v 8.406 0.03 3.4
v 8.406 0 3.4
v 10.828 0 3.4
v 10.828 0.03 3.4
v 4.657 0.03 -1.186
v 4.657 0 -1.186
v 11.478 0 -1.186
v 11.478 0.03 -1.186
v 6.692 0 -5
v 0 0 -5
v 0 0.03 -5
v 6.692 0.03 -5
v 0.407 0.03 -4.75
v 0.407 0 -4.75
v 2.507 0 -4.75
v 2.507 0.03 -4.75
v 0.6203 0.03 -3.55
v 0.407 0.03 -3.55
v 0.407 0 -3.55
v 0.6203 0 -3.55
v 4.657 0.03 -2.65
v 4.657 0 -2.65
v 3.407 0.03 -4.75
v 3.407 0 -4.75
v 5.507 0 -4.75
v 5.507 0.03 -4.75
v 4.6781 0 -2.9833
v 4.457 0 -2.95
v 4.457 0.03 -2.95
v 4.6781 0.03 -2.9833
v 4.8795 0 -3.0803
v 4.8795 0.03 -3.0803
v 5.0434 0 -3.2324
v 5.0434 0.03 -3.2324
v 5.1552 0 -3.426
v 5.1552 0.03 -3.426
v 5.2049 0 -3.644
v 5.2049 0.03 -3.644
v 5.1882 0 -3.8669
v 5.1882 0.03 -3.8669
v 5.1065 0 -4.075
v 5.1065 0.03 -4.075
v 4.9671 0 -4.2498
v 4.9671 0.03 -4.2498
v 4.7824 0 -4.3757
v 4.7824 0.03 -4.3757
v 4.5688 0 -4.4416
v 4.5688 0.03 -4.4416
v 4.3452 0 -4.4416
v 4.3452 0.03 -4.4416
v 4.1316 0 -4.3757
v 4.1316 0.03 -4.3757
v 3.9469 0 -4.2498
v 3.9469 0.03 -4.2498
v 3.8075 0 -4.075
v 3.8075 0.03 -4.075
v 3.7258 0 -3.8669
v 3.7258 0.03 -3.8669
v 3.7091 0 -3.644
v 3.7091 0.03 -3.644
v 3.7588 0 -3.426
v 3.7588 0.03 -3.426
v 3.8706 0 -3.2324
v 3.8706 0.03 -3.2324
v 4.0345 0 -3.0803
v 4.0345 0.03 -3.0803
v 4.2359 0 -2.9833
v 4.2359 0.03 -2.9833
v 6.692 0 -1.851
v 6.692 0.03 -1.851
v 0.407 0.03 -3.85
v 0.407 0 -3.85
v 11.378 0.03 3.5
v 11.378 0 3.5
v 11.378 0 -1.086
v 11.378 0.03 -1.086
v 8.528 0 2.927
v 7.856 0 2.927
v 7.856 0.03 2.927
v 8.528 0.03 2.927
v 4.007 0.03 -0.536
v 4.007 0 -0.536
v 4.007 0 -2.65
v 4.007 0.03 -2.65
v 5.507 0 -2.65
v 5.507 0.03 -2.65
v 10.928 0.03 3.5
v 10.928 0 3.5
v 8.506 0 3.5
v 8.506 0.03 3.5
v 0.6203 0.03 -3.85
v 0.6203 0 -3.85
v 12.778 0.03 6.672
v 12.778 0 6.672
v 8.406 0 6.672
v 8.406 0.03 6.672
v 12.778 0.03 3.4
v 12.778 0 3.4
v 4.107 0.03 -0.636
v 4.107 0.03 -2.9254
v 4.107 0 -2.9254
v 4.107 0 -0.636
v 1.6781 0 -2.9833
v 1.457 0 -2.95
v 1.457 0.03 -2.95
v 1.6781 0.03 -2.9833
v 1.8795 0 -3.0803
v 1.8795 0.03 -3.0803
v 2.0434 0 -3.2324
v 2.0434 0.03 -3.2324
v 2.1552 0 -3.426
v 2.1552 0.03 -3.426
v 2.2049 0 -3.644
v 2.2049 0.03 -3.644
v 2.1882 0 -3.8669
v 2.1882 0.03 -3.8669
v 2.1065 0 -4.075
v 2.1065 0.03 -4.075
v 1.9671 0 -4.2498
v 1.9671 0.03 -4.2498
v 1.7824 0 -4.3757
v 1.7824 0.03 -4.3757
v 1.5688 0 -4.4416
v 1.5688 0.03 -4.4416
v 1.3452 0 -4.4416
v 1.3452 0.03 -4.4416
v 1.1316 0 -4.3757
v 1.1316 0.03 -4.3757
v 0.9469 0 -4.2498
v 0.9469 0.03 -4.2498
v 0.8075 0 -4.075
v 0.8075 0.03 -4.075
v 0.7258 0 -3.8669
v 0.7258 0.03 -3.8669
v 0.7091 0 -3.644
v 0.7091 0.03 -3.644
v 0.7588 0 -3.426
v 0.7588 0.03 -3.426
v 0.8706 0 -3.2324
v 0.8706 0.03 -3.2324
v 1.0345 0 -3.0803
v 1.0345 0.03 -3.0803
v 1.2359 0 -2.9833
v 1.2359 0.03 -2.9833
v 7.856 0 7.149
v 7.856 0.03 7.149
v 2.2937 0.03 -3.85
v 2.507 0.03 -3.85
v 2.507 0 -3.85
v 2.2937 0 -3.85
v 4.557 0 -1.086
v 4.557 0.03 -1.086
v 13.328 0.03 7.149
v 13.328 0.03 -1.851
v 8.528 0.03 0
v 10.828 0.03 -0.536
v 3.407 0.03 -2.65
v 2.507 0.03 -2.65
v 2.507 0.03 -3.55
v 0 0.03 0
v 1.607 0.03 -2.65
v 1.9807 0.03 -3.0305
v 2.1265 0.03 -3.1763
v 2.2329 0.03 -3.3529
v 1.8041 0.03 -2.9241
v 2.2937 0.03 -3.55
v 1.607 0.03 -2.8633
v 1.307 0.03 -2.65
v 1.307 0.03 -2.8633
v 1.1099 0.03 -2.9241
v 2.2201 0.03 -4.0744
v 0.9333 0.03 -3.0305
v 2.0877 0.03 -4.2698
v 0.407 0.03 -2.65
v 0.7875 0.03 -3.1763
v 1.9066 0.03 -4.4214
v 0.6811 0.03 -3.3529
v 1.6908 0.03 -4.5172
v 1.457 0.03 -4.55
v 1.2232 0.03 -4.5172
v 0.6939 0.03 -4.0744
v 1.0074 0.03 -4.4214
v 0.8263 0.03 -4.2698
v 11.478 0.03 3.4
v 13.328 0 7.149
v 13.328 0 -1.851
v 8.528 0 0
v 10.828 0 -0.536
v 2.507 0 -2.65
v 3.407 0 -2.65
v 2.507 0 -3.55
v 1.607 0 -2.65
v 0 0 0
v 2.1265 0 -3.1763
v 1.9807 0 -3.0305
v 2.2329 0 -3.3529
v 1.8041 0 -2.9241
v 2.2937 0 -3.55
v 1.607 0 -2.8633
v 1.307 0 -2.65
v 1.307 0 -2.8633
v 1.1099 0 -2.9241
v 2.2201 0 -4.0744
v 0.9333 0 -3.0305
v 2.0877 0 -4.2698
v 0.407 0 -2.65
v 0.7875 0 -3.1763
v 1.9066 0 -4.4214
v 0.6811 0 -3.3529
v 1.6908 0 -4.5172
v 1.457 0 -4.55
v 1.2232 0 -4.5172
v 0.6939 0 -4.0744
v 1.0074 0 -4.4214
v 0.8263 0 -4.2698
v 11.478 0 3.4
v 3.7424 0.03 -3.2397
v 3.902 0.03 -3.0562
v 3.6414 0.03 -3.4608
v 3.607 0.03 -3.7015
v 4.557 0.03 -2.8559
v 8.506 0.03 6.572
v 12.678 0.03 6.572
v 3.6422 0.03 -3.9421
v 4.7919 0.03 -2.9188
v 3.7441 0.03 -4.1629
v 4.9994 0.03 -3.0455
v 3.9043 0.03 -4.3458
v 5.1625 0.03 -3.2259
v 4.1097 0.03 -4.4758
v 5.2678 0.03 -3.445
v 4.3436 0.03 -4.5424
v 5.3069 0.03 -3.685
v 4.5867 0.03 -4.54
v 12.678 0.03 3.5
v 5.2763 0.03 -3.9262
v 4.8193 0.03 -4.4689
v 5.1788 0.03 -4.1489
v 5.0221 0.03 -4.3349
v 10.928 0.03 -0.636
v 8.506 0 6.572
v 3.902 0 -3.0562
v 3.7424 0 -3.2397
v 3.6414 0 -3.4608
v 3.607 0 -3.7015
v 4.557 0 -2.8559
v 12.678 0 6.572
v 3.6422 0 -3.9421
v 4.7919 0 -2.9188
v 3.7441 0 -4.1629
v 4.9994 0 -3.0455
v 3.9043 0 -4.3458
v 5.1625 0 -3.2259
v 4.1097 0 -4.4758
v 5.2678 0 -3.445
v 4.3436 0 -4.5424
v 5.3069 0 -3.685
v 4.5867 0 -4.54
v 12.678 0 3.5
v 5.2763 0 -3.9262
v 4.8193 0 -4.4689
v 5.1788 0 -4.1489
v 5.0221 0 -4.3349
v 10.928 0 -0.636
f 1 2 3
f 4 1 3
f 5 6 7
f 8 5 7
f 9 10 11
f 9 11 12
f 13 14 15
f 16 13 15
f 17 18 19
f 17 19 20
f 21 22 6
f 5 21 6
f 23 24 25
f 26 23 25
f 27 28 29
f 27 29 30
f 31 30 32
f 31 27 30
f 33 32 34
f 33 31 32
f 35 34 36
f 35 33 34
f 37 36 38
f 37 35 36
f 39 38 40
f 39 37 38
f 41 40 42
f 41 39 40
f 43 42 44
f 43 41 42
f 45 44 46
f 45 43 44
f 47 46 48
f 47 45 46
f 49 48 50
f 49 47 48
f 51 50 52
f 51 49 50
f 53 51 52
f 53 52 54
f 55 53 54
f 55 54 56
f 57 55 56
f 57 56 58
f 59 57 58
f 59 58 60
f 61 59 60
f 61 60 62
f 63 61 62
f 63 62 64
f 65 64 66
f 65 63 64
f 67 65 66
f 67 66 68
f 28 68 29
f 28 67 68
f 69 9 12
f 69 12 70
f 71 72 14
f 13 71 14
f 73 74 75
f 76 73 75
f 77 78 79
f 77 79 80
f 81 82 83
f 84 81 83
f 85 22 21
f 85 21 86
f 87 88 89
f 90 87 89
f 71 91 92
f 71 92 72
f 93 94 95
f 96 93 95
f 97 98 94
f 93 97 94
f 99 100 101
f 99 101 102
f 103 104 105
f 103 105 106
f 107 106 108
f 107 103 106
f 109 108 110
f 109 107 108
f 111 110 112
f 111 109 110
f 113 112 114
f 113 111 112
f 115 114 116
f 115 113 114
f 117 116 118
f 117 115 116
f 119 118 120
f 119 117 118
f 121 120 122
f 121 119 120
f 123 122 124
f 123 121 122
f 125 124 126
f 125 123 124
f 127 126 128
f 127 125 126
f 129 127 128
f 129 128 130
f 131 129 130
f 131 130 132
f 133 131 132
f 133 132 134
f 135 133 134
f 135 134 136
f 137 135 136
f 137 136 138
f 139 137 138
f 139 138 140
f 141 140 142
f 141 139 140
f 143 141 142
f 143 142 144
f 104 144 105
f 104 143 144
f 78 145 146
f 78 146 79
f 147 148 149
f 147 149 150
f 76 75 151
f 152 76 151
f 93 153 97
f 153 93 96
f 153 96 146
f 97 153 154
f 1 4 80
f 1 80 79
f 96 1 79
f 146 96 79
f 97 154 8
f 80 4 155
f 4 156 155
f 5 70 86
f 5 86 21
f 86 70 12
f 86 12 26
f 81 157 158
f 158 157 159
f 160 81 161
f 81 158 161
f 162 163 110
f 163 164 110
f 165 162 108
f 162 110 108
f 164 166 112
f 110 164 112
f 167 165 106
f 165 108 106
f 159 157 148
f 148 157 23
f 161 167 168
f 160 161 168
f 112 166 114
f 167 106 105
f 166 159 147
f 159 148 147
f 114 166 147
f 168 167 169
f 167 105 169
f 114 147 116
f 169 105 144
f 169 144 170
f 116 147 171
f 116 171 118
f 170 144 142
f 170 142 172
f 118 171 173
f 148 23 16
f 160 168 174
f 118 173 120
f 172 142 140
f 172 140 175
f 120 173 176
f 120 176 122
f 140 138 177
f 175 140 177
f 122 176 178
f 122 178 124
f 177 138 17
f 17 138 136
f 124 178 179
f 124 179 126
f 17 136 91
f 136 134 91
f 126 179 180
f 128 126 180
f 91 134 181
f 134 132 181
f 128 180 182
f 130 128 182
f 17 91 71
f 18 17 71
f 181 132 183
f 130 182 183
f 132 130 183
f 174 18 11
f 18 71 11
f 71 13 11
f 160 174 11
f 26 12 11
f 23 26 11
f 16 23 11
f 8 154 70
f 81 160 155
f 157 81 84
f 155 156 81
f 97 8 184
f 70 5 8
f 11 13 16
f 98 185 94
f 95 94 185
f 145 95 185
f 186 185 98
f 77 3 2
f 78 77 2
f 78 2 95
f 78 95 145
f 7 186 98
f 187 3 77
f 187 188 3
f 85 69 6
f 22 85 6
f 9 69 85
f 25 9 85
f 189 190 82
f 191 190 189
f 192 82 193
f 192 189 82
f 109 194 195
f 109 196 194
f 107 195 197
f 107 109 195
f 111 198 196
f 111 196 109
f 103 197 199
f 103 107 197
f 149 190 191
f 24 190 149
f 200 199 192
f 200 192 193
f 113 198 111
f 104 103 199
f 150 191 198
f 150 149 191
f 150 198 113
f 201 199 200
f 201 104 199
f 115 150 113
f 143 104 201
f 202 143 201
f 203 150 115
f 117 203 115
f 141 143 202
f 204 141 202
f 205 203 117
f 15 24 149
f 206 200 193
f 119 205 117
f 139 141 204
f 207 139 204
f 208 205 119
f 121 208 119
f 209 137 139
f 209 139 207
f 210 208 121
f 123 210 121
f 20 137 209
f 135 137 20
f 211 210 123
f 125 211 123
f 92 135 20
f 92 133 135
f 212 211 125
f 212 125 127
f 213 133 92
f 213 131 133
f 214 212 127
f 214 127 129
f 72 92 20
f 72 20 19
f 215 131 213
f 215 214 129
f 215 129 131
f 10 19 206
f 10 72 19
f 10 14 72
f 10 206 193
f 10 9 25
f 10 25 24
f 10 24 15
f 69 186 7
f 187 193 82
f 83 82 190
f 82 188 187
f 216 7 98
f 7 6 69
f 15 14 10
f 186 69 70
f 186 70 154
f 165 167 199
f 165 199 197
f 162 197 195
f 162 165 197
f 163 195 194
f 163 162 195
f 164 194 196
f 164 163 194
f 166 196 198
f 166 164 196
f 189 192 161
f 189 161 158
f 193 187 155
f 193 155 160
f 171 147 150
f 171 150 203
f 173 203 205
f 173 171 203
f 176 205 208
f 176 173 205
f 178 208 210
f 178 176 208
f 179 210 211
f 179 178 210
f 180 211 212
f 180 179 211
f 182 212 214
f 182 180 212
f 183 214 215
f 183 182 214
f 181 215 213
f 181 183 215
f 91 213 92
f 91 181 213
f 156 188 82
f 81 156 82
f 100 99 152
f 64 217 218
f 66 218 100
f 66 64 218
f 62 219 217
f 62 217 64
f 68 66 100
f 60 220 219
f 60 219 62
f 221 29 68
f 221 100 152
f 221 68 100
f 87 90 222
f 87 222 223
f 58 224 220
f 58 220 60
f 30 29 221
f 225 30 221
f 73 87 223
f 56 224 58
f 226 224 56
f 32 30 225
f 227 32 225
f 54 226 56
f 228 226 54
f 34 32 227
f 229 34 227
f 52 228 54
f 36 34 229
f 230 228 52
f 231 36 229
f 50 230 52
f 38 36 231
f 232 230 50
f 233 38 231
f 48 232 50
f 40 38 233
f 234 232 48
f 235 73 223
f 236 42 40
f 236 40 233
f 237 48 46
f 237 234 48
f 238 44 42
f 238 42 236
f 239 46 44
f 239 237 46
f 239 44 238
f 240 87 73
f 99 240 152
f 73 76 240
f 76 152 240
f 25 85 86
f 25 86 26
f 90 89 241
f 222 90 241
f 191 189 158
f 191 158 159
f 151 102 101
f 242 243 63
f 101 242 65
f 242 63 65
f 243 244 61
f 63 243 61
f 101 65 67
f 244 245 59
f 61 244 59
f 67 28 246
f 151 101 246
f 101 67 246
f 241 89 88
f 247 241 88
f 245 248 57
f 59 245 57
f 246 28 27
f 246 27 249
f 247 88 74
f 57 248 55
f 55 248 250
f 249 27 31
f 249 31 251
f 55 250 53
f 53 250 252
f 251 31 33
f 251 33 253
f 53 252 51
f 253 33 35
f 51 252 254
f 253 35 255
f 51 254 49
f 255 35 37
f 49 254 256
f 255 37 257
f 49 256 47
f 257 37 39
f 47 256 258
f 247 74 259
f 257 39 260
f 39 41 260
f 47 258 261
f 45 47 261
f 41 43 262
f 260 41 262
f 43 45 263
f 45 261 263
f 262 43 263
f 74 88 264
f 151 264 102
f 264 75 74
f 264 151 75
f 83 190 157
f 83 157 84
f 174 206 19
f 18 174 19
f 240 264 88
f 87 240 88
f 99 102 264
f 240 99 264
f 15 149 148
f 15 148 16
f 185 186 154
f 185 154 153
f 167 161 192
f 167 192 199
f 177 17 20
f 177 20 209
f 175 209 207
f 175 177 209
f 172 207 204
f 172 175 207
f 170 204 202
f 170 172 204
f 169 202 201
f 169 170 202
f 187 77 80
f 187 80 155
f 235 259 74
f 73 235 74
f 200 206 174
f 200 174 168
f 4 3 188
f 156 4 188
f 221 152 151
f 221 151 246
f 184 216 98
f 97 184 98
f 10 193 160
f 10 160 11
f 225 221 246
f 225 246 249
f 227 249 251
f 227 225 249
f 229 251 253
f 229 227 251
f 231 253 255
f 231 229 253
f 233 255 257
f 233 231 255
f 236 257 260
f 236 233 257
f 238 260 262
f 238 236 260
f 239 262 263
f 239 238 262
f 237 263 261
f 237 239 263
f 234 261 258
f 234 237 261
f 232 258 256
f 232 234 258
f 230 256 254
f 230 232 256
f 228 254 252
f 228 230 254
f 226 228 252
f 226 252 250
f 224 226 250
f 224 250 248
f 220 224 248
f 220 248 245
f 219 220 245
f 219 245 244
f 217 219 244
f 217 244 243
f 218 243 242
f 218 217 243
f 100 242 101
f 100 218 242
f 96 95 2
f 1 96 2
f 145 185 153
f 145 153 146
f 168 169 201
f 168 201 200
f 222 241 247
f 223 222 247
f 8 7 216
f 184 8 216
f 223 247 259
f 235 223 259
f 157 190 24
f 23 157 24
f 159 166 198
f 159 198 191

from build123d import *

# Parameters (mm, degrees)
SKETCH1_W               = 2.1
SKETCH1_H               = 2.1
BOSS_EXTRUDE1_DEPTH     = 0.03
CUT_EXTRUDE1_DEPTH      = 16.124307753
CUT_EXTRUDE1_DEPTH_BACK = 16.124307753
BOSS_EXTRUDE2_DEPTH     = 0.03
BOSS_EXTRUDE3_DEPTH     = 0.03
CUT_EXTRUDE2_DEPTH      = 16.124307753
CUT_EXTRUDE2_DEPTH_BACK = 16.124307753
SKETCH5_R               = 0.75


with BuildPart() as part:
    # Sketch1 → Boss-Extrude1 (new body)
    with BuildSketch(Plane(origin=(0, 0, 0), x_dir=(1, 0, 0), z_dir=(0, 1, 0))):
        Polygon((0, 0), (0, 5), (6.692, 5), (6.692, 1.851), (13.328, 1.851), (13.328, -7.149), (7.856, -7.149), (7.856, -2.927), (8.528, -2.927), (8.528, 0), align=None)
        with Locations((1.457, 3.7)):
            Rectangle(SKETCH1_W, SKETCH1_H, mode=Mode.SUBTRACT)
        with Locations((4.457, 3.7)):
            Rectangle(SKETCH1_W, SKETCH1_H, mode=Mode.SUBTRACT)
    extrude(amount=BOSS_EXTRUDE1_DEPTH)

    # Sketch2 → Cut-Extrude1 (cut, two sides: drawn at the far end of the back side and taken through both)
    with BuildSketch(Plane(origin=(0, 0.03, 0), x_dir=(1, 0, 0), z_dir=(0, 1, 0)).offset(-CUT_EXTRUDE1_DEPTH_BACK)):
        Polygon((4.107, 2.65), (4.107, 0.636), (10.928, 0.636), (10.928, -3.5), (8.506, -3.5), (8.506, -6.572), (12.678, -6.572), (12.678, -3.5), (11.378, -3.5), (11.378, 1.086), (4.557, 1.086), (4.557, 2.65), (4.657, 2.65), (4.657, 1.186), (11.478, 1.186), (11.478, -3.4), (12.778, -3.4), (12.778, -6.672), (8.406, -6.672), (8.406, -3.4), (10.828, -3.4), (10.828, 0.536), (4.007, 0.536), (4.007, 2.65), align=None)
    extrude(amount=CUT_EXTRUDE1_DEPTH + CUT_EXTRUDE1_DEPTH_BACK, mode=Mode.SUBTRACT)


with BuildPart() as cut_extrude1_piece_1:
    # of the separate pieces the step leaves, piece 1, a body of its own (cut_extrude1_pieces)
    add(part.part.solids().sort_by_distance((0, 0, 0))[0])

    # Sketch4 → Boss-Extrude3 (add)
    with BuildSketch(Plane(origin=(0, 0.03, 0), x_dir=(1, 0, 0), z_dir=(0, 1, 0))):
        with BuildLine():
            Line((1.307, 2.65), (1.607, 2.65))
            Line((1.607, 2.65), (1.607, 2.863339973))
            ThreePointArc((1.607, 2.863339973), (2.058040764, 3.098959236), (2.293660027, 3.55))
            Line((2.293660027, 3.55), (2.507, 3.55))
            Line((2.507, 3.55), (2.507, 3.85))
            Line((2.507, 3.85), (2.293660027, 3.85))
            ThreePointArc((2.293660027, 3.85), (1.457, 4.55), (0.620339973, 3.85))
            Line((0.620339973, 3.85), (0.407, 3.85))
            Line((0.407, 3.85), (0.407, 3.55))
            Line((0.407, 3.55), (0.620339973, 3.55))
            ThreePointArc((0.620339973, 3.55), (0.855959236, 3.098959236), (1.307, 2.863339973))
            Line((1.307, 2.863339973), (1.307, 2.65))
        make_face()
    extrude(amount=-BOSS_EXTRUDE3_DEPTH)


with BuildPart() as cut_extrude1_piece_2:
    # of the separate pieces the step leaves, piece 2, a body of its own (cut_extrude1_pieces)
    add(part.part.solids().sort_by_distance((4.107, 0, -2.65))[0])

    # Sketch3 → Boss-Extrude2 (add)
    with BuildSketch(Plane(origin=(0, 0.03, 0), x_dir=(1, 0, 0), z_dir=(0, 1, 0))):
        with BuildLine():
            Line((4.107, 2.65), (4.557, 2.65))
            Line((4.557, 2.65), (4.557, 2.855902849))
            ThreePointArc((4.557, 2.855902849), (4.58674043, 4.54004013), (4.107, 2.925403331))
            Line((4.107, 2.925403331), (4.107, 2.65))
        make_face()
    extrude(amount=-BOSS_EXTRUDE2_DEPTH)


with BuildPart() as cut_extrude2_tool:
    # Sketch5 → Cut-Extrude2 (new, two sides: drawn at the far end of the back side and taken through both)
    with BuildSketch(Plane(origin=(0, 0.03, 0), x_dir=(1, 0, 0), z_dir=(0, 1, 0)).offset(-CUT_EXTRUDE2_DEPTH_BACK)):
        with Locations(Location((1.457, 3.7, 0), (0, 0, 270))):
            Circle(SKETCH5_R)
        with Locations(Location((4.457, 3.7, 0), (0, 0, 270))):
            Circle(SKETCH5_R)
    extrude(amount=CUT_EXTRUDE2_DEPTH + CUT_EXTRUDE2_DEPTH_BACK)


with BuildPart() as cut_extrude1_piece_1_1:
    add(cut_extrude1_piece_1.part)

    # Cut-Extrude2: cut by cut_extrude2_tool
    add(cut_extrude2_tool.part, mode=Mode.SUBTRACT)


with BuildPart() as cut_extrude1_piece_2_1:
    add(cut_extrude1_piece_2.part)

    # Cut-Extrude2: cut by cut_extrude2_tool
    add(cut_extrude2_tool.part, mode=Mode.SUBTRACT)


solid = Compound([cut_extrude1_piece_1_1.part, cut_extrude1_piece_2_1.part])
